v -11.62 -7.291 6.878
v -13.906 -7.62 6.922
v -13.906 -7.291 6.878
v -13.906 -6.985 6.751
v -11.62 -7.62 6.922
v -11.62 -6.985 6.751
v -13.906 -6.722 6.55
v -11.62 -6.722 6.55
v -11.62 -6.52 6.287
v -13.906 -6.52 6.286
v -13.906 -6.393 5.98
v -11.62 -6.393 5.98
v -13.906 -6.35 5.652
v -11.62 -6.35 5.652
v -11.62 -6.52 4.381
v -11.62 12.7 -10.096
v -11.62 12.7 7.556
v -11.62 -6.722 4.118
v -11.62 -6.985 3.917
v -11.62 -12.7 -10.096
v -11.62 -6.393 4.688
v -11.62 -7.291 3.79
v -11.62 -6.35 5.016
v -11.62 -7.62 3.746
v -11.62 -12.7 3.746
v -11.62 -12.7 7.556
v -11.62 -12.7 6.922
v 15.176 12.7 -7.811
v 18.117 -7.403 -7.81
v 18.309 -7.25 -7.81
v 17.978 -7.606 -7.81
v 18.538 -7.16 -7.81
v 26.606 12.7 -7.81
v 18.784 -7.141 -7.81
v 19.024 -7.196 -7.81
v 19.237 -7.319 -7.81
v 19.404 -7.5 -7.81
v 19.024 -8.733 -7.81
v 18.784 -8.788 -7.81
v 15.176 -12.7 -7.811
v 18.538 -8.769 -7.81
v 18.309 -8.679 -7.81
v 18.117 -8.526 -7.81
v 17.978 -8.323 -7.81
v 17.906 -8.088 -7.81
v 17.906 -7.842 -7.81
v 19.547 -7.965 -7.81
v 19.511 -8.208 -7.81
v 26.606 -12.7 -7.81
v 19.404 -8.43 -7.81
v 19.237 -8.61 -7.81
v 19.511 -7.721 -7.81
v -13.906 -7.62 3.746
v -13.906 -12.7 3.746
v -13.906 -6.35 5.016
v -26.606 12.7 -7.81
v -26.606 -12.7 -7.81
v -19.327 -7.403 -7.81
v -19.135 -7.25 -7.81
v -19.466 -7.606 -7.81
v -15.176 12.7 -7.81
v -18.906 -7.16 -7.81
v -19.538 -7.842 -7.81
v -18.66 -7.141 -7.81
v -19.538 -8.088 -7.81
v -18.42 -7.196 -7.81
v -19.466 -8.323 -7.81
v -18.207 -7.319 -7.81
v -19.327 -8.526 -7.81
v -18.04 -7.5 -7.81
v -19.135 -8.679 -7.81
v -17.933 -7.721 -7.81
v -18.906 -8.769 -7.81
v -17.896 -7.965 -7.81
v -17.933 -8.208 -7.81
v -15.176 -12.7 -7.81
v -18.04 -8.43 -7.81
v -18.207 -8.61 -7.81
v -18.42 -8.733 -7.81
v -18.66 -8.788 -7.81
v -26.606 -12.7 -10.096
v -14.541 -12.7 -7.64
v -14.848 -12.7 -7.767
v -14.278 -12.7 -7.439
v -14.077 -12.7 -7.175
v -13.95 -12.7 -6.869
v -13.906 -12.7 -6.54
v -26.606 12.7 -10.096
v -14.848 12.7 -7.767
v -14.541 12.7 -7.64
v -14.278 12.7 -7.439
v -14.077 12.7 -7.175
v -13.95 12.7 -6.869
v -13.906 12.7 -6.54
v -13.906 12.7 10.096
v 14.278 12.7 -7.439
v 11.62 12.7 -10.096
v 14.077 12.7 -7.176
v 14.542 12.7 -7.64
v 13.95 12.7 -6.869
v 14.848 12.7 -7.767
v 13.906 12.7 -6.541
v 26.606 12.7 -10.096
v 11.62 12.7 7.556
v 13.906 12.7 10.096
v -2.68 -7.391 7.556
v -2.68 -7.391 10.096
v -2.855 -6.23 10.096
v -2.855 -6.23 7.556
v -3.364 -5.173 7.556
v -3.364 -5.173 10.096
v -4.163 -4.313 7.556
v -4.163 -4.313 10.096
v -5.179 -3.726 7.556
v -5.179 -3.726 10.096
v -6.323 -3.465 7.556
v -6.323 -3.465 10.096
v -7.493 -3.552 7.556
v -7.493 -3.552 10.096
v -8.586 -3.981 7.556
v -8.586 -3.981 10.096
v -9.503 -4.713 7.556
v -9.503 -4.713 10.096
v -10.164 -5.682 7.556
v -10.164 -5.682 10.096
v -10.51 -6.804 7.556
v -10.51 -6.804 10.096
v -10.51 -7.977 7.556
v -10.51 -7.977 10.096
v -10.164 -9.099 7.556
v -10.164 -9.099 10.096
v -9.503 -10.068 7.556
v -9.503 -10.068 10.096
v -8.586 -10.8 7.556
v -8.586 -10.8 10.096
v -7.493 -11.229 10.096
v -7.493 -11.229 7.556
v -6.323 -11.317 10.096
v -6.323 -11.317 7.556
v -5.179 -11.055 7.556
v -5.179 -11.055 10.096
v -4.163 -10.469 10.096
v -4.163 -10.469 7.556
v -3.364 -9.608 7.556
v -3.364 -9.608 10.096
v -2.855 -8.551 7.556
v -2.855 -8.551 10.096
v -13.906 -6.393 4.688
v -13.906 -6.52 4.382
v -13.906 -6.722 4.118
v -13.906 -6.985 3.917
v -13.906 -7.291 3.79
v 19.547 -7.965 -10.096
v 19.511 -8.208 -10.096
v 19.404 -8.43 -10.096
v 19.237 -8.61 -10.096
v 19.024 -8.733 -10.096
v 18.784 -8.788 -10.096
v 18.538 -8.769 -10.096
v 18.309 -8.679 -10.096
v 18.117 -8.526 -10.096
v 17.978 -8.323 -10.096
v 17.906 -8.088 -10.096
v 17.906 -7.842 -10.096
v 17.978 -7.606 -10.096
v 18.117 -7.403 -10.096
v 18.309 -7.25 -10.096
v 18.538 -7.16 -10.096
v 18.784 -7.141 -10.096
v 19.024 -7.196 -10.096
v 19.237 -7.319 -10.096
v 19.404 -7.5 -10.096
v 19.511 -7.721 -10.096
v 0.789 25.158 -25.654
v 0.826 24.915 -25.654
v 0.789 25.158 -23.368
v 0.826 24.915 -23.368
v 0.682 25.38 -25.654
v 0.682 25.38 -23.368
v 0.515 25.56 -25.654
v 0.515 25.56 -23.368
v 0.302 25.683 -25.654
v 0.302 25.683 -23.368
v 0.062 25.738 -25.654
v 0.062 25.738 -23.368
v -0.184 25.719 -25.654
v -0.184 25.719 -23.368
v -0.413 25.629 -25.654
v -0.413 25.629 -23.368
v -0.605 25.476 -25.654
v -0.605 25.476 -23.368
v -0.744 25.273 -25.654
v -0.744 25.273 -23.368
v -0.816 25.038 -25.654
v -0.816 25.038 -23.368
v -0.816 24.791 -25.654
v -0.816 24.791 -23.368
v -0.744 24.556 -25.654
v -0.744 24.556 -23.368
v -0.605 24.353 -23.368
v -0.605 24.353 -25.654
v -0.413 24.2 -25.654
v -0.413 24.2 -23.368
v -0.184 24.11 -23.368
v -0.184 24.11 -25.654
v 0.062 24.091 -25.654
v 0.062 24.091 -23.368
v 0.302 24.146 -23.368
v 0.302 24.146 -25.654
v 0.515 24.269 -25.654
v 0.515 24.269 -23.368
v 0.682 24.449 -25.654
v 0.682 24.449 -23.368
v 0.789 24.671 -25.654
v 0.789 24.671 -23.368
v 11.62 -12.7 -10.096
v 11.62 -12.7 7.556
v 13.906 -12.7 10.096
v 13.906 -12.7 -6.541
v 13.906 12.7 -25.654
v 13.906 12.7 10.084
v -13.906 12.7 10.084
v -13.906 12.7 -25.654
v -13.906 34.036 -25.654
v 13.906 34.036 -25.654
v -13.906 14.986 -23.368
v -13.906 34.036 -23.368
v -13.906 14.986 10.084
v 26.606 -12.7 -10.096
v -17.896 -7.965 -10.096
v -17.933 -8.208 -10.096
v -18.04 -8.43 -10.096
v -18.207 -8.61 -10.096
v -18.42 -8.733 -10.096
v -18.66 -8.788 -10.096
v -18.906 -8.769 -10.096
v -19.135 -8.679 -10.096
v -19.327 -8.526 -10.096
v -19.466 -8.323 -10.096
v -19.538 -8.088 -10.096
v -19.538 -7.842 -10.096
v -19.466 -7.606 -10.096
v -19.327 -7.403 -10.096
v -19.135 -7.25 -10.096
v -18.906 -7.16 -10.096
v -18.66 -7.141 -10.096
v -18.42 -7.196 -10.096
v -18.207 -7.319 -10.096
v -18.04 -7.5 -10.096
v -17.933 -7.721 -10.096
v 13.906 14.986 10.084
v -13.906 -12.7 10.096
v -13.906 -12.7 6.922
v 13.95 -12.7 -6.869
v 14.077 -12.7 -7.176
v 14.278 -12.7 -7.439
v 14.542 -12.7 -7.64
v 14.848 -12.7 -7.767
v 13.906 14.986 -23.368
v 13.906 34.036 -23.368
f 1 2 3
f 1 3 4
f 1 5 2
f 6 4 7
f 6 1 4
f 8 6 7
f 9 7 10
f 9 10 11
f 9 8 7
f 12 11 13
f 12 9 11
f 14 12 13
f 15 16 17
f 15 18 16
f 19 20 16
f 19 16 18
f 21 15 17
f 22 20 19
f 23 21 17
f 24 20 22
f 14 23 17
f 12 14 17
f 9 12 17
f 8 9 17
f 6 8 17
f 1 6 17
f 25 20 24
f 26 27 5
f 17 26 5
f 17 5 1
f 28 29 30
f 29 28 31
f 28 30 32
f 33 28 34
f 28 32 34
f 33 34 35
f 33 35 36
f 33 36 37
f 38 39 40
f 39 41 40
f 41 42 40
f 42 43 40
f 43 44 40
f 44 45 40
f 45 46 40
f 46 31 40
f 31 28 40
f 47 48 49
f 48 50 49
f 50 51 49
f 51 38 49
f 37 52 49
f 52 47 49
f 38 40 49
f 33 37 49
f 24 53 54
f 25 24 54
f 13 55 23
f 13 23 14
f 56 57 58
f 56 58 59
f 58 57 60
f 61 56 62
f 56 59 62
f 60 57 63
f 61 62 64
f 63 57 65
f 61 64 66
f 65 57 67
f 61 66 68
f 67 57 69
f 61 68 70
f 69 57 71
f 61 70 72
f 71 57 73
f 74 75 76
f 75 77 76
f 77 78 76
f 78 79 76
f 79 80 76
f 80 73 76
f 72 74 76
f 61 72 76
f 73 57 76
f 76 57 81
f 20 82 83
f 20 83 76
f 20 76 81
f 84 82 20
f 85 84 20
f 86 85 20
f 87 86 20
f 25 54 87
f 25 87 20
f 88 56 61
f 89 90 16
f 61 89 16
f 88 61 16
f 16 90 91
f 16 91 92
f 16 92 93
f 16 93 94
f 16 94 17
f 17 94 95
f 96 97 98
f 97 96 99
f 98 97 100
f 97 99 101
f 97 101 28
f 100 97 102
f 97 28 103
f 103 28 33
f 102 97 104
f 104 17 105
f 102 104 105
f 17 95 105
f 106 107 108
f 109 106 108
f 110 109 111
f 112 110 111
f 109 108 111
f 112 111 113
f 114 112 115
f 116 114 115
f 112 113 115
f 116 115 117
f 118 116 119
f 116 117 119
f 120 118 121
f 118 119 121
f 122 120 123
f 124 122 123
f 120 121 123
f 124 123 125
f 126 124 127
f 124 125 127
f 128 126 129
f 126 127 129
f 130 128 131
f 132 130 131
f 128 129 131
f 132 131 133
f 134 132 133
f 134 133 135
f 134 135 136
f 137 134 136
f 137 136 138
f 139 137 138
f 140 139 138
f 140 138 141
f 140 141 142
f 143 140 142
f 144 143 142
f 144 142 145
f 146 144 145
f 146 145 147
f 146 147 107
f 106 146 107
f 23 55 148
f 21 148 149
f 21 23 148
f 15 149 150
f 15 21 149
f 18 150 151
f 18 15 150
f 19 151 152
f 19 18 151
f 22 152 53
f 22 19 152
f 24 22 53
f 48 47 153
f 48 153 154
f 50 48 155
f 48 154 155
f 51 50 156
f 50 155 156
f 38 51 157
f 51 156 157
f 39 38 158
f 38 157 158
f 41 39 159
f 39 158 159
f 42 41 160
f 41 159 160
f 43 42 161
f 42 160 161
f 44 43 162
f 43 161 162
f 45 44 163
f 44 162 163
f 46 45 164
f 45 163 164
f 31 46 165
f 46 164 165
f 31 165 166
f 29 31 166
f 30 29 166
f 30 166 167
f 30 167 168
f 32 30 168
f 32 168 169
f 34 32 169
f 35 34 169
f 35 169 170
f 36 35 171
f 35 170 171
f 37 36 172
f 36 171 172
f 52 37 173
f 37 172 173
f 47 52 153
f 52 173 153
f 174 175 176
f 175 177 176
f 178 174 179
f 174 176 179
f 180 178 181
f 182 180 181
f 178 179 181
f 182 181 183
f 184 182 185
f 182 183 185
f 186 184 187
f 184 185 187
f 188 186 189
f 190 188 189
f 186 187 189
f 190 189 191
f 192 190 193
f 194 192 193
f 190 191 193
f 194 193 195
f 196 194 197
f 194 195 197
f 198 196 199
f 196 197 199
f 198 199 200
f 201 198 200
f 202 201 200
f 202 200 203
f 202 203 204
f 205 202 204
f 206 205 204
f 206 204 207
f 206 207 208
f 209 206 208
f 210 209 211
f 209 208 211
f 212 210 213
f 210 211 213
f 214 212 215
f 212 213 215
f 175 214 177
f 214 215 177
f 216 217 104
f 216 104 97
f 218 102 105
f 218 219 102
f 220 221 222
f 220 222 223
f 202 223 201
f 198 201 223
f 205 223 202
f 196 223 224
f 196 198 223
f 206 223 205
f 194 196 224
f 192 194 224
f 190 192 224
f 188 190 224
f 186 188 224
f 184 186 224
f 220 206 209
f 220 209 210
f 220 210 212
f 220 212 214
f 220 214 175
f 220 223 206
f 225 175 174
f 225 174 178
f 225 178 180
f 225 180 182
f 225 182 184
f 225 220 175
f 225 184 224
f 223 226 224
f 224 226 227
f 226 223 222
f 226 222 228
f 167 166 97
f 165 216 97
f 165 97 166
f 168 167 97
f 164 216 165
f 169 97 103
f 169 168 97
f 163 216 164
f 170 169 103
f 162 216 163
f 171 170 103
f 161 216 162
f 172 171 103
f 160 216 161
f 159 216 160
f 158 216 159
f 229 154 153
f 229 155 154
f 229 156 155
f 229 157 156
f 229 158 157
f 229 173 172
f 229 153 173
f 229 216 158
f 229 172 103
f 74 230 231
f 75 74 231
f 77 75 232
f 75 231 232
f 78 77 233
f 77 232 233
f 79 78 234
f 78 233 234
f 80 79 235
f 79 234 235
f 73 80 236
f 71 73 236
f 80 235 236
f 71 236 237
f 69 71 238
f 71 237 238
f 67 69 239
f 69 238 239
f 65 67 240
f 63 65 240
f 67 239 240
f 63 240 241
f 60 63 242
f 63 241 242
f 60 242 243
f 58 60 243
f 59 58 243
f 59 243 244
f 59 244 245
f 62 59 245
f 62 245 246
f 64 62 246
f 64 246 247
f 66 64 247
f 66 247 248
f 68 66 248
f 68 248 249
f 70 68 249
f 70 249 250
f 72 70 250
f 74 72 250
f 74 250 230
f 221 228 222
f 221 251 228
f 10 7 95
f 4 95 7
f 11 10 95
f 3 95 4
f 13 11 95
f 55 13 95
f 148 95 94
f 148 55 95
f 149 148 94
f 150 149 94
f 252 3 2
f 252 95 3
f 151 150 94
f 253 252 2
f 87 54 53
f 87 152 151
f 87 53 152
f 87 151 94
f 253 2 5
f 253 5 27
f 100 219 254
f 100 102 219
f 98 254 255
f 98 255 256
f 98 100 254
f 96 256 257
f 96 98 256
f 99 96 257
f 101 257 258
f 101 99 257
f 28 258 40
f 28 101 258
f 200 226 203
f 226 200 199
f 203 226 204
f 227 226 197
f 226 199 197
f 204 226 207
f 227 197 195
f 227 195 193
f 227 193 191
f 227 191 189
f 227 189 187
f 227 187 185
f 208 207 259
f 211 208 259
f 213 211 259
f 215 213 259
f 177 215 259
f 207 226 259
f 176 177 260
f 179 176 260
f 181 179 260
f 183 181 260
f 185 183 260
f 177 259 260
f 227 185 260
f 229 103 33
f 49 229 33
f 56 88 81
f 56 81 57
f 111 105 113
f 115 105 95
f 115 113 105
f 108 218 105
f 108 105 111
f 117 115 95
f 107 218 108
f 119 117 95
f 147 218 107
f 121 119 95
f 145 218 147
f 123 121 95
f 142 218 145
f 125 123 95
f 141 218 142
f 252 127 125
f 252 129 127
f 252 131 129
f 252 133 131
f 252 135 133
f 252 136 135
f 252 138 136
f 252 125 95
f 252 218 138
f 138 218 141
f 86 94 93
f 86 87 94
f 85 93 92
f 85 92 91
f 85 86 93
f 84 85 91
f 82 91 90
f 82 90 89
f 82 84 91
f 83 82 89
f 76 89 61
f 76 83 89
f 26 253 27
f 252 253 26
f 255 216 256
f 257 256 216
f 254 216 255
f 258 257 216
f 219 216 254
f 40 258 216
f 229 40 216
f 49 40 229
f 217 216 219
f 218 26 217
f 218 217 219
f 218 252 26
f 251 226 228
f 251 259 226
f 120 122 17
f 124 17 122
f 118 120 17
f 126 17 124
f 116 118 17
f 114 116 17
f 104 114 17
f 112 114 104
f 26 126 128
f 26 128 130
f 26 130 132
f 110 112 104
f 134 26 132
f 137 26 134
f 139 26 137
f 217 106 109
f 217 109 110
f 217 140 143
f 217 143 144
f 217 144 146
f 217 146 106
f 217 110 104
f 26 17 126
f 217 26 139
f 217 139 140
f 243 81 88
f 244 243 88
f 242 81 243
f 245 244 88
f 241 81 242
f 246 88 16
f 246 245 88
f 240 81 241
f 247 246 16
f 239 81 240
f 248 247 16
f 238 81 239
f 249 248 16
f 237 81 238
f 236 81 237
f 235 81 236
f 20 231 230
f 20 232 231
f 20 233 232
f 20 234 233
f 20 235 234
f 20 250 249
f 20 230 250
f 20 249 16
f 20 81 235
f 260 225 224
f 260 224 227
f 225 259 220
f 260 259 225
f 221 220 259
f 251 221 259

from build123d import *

# Parameters (mm, degrees)
F0_W     = 12.7
F0_H     = 2.286
F1_DEPTH = 12.7
F2_W     = 19.05
F2_H     = 2.286
F3_DEPTH = 13.9065
F5_R     = 3.937
F5_R_2   = 0.8255
F6_DEPTH = 63.5
F4_R     = 0.8255
F7_DEPTH = 63.5
F8_W     = 6.35
F8_H     = 3.175
F9_DEPTH = 25.4
F10_R    = 1.27


with BuildPart() as f1:
    # F0 (on Front) → F1 (new body, symmetric)
    with BuildSketch(Plane.XZ):
        Polygon((13.9065, -7.8105), (13.9065, 10.0965), (-13.9065, 10.0965), (-13.9065, -7.8105), (-13.9065, -10.0965), (-11.6205, -10.0965), (-11.6205, 7.5565), (11.6205, 7.5565), (11.6205, -10.0965), (13.9065, -10.0965), align=None)
        with Locations((-20.2565, -8.9535)):
            Rectangle(F0_W, F0_H)
        with Locations((20.2565, -8.9535)):
            Rectangle(F0_W, F0_H)
    extrude(amount=F1_DEPTH, both=True)


with BuildPart() as f3:
    # F2 (on Right) → F3 (new body, symmetric)
    with BuildSketch(Plane.YZ):
        Polygon((14.985964, 10.083703), (12.699964, 10.083703), (12.699964, -25.654097), (14.985964, -25.654097), (14.985964, -23.368097), align=None)
        with Locations((24.510964, -24.511097)):
            Rectangle(F2_W, F2_H)
    extrude(amount=F3_DEPTH, both=True)


with BuildPart() as f6_tool:
    # F5 (on face) → F6 (new body, symmetric)
    with BuildSketch(Plane.XY.offset(10.0965)):
        with Locations((-6.617363, -7.390599)):
            Circle(F5_R)
        with Locations((0, 24.914509)):
            Circle(F5_R_2)
    extrude(amount=F6_DEPTH, both=True)


with BuildPart() as f1_1:
    add(f1.part)

    # F6: cut by f6_tool
    add(f6_tool.part, mode=Mode.SUBTRACT)

    # F4 (on face) → F7 (cut, symmetric)
    with BuildSketch(Plane(origin=(0, 0, -10.0965), x_dir=(1, 0, 0), z_dir=(0, 0, -1))):
        with Locations((-18.721931, 7.964557)):
            Circle(F4_R)
        with Locations((18.721931, 7.964557)):
            Circle(F4_R)
    extrude(amount=F7_DEPTH, both=True, mode=Mode.SUBTRACT)

    # F8 (on face) → F9 (cut)
    with BuildSketch(Plane(origin=(-13.9065, 0, 0), x_dir=(0, -1, 0), z_dir=(-1, 0, 0))):
        with Locations((9.525, 5.334)):
            Rectangle(F8_W, F8_H)
    extrude(amount=-F9_DEPTH, mode=Mode.SUBTRACT)

    # F10
    f10_edges = [f1_1.edges().sort_by_distance(p)[0] for p in [
        (-12.7635, -6.35, 3.7465),
        (-12.7635, -6.35, 6.9215),
        (-13.9065, 0, -7.8105),
        (13.9065, 0, -7.8105),
    ]]
    fillet(f10_edges, radius=F10_R)


with BuildPart() as f3_1:
    add(f3.part)

    # F6: cut by f6_tool
    add(f6_tool.part, mode=Mode.SUBTRACT)


solid = Compound([f1_1.part, f3_1.part])
